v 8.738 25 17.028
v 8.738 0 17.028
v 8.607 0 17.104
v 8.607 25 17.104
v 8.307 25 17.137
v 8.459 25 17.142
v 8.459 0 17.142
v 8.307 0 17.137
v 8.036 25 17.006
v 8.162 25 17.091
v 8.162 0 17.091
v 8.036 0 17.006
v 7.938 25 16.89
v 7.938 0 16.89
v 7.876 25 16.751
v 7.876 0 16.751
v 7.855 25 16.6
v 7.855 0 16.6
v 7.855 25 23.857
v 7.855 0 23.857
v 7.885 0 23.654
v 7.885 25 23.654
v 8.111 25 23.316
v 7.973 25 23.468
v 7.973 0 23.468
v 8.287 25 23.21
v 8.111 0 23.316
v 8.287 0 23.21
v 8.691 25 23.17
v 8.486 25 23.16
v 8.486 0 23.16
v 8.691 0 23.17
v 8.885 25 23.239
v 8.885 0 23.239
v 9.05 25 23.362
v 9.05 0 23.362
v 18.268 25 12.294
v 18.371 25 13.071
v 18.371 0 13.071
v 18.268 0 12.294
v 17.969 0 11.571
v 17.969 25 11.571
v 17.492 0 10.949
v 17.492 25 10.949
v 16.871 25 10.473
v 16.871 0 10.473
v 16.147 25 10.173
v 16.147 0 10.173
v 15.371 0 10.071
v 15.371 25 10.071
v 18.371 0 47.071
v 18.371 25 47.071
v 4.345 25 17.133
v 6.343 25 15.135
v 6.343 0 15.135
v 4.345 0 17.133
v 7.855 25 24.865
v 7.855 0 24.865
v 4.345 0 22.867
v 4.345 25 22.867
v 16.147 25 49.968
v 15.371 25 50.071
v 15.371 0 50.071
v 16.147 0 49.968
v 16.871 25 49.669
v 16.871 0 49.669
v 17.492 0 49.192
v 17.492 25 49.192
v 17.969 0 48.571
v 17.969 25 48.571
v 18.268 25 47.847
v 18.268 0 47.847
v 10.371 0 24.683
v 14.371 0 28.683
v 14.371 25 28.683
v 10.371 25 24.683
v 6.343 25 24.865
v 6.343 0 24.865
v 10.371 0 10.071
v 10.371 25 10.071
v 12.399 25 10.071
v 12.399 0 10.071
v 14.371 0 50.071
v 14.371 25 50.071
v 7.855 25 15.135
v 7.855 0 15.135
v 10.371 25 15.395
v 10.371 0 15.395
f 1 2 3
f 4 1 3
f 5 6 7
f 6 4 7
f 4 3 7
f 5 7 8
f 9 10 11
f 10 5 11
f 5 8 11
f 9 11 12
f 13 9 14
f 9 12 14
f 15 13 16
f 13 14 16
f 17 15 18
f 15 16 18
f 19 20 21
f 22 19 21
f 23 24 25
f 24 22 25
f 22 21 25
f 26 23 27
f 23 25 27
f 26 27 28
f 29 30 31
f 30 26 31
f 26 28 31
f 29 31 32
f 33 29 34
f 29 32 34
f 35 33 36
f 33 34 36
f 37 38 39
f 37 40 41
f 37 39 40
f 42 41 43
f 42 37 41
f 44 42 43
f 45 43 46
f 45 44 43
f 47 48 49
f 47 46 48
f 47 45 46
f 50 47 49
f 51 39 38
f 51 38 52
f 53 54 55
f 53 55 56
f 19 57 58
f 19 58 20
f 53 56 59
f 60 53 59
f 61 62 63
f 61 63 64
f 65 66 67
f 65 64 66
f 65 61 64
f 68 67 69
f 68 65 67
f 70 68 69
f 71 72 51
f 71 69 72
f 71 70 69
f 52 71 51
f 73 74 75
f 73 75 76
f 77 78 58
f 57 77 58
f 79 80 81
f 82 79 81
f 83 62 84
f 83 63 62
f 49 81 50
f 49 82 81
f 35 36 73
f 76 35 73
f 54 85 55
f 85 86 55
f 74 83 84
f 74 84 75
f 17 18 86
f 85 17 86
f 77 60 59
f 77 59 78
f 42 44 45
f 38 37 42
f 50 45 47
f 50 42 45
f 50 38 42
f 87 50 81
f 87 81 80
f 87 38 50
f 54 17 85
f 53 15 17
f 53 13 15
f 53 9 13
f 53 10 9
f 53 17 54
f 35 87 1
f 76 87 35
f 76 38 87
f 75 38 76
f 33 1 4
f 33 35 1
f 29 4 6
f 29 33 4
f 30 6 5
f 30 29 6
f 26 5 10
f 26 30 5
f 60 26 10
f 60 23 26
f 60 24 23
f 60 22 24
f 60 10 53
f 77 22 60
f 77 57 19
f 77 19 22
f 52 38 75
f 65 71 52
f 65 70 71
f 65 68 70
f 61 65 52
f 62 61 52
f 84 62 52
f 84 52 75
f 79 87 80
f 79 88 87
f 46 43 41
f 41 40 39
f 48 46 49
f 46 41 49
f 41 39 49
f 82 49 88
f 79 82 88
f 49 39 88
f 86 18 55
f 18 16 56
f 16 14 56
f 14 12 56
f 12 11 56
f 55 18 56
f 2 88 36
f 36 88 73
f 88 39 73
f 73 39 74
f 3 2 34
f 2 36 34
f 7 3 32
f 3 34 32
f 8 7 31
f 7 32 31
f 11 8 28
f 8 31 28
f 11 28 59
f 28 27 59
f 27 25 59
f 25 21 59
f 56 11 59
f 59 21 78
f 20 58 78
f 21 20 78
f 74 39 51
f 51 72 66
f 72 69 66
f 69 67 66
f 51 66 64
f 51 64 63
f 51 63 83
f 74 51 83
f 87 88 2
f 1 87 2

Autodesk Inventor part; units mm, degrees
ref_plane "YZ Plane" through (0, 0, 0) normal (1, 0, 0) x (0, 1, 0)
ref_plane "XZ Plane" through (0, 0, 0) normal (0, 1, 0) x (-1, 0, 0)
ref_plane "XY Plane" through (0, 0, 0) normal (0, 0, 1) x (1, 0, 0)
sketch "Sketch1" plane through (0, 0, 0) normal (0, 1, 0) x (-1, 0, 0)
  line L0 (-10.3707, 15.395) -> (-8.7381, 17.0275)
  arc A0 (-7.8549, 16.6) -> (-8.7381, 17.0275) centre (-8.4, 16.6) ccw
  line L1 (-7.8549, 16.6) -> (-7.8549, 15.135)
  line L2 (-7.8549, 15.135) -> (-6.3429, 15.135)
  line L3 (-6.3429, 15.135) -> (-4.3451, 17.1329)
  line L4 (-4.3451, 17.1329) -> (-4.3451, 22.8671)
  line L5 (-4.3451, 22.8671) -> (-6.3429, 24.865)
  line L6 (-6.3429, 24.865) -> (-7.8549, 24.865)
  line L7 (-7.8549, 24.865) -> (-7.8549, 23.8568)
  arc A1 (-9.0499, 23.3618) -> (-7.8549, 23.8568) centre (-8.5549, 23.8568) ccw
  line L8 (-9.0499, 23.3618) -> (-10.3707, 24.6827)
  line L9 (-10.3707, 15.395) -> (-10.3707, 10.0707)
  line L10 (-10.3707, 10.0707) -> (-12.399, 10.0707)
  line L11 (-10.3707, 10.0707) -> (-18.3707, 10.0707)
  line L12 (-18.3707, 10.0707) -> (-18.3707, 50.0707)
  line L13 (-18.3707, 50.0707) -> (-14.3707, 50.0707)
  line L14 (-10.3707, 15.395) -> (-10.3707, 10.0707)
  line L15 (-14.3707, 50.0707) -> (-14.3707, 28.6827)
  line L16 (-14.3707, 28.6827) -> (-10.3707, 24.6827)
  line L17 (-10.3707, 24.6827) -> (-10.3707, 24.865)
  line L18 (-10.3707, 50.0707) -> (-10.3707, 28.8927)
  line L19 (-10.3707, 24.865) -> (-10.3707, 24.6827)
  point P0 (0, 0)
  point P1 (-9.0499, 23.3618)
  dimension "d5" = 40
extrude "Extrusion1" add sketch "Sketch1" along normal blind 25
sketch "Sketch3" plane through (10.3707, 0, 10.0707) normal (0, 0, -1) x (-1, 0, 0)
  point P0 (10.3707, 0)
fillet "Fillet1" radius 3 1 edges at (18.3707, 12.5, 10.0707)
fillet "Fillet2" radius 3 1 edges at (18.3707, 12.5, 50.0707)
properties part number "LED Mount"
